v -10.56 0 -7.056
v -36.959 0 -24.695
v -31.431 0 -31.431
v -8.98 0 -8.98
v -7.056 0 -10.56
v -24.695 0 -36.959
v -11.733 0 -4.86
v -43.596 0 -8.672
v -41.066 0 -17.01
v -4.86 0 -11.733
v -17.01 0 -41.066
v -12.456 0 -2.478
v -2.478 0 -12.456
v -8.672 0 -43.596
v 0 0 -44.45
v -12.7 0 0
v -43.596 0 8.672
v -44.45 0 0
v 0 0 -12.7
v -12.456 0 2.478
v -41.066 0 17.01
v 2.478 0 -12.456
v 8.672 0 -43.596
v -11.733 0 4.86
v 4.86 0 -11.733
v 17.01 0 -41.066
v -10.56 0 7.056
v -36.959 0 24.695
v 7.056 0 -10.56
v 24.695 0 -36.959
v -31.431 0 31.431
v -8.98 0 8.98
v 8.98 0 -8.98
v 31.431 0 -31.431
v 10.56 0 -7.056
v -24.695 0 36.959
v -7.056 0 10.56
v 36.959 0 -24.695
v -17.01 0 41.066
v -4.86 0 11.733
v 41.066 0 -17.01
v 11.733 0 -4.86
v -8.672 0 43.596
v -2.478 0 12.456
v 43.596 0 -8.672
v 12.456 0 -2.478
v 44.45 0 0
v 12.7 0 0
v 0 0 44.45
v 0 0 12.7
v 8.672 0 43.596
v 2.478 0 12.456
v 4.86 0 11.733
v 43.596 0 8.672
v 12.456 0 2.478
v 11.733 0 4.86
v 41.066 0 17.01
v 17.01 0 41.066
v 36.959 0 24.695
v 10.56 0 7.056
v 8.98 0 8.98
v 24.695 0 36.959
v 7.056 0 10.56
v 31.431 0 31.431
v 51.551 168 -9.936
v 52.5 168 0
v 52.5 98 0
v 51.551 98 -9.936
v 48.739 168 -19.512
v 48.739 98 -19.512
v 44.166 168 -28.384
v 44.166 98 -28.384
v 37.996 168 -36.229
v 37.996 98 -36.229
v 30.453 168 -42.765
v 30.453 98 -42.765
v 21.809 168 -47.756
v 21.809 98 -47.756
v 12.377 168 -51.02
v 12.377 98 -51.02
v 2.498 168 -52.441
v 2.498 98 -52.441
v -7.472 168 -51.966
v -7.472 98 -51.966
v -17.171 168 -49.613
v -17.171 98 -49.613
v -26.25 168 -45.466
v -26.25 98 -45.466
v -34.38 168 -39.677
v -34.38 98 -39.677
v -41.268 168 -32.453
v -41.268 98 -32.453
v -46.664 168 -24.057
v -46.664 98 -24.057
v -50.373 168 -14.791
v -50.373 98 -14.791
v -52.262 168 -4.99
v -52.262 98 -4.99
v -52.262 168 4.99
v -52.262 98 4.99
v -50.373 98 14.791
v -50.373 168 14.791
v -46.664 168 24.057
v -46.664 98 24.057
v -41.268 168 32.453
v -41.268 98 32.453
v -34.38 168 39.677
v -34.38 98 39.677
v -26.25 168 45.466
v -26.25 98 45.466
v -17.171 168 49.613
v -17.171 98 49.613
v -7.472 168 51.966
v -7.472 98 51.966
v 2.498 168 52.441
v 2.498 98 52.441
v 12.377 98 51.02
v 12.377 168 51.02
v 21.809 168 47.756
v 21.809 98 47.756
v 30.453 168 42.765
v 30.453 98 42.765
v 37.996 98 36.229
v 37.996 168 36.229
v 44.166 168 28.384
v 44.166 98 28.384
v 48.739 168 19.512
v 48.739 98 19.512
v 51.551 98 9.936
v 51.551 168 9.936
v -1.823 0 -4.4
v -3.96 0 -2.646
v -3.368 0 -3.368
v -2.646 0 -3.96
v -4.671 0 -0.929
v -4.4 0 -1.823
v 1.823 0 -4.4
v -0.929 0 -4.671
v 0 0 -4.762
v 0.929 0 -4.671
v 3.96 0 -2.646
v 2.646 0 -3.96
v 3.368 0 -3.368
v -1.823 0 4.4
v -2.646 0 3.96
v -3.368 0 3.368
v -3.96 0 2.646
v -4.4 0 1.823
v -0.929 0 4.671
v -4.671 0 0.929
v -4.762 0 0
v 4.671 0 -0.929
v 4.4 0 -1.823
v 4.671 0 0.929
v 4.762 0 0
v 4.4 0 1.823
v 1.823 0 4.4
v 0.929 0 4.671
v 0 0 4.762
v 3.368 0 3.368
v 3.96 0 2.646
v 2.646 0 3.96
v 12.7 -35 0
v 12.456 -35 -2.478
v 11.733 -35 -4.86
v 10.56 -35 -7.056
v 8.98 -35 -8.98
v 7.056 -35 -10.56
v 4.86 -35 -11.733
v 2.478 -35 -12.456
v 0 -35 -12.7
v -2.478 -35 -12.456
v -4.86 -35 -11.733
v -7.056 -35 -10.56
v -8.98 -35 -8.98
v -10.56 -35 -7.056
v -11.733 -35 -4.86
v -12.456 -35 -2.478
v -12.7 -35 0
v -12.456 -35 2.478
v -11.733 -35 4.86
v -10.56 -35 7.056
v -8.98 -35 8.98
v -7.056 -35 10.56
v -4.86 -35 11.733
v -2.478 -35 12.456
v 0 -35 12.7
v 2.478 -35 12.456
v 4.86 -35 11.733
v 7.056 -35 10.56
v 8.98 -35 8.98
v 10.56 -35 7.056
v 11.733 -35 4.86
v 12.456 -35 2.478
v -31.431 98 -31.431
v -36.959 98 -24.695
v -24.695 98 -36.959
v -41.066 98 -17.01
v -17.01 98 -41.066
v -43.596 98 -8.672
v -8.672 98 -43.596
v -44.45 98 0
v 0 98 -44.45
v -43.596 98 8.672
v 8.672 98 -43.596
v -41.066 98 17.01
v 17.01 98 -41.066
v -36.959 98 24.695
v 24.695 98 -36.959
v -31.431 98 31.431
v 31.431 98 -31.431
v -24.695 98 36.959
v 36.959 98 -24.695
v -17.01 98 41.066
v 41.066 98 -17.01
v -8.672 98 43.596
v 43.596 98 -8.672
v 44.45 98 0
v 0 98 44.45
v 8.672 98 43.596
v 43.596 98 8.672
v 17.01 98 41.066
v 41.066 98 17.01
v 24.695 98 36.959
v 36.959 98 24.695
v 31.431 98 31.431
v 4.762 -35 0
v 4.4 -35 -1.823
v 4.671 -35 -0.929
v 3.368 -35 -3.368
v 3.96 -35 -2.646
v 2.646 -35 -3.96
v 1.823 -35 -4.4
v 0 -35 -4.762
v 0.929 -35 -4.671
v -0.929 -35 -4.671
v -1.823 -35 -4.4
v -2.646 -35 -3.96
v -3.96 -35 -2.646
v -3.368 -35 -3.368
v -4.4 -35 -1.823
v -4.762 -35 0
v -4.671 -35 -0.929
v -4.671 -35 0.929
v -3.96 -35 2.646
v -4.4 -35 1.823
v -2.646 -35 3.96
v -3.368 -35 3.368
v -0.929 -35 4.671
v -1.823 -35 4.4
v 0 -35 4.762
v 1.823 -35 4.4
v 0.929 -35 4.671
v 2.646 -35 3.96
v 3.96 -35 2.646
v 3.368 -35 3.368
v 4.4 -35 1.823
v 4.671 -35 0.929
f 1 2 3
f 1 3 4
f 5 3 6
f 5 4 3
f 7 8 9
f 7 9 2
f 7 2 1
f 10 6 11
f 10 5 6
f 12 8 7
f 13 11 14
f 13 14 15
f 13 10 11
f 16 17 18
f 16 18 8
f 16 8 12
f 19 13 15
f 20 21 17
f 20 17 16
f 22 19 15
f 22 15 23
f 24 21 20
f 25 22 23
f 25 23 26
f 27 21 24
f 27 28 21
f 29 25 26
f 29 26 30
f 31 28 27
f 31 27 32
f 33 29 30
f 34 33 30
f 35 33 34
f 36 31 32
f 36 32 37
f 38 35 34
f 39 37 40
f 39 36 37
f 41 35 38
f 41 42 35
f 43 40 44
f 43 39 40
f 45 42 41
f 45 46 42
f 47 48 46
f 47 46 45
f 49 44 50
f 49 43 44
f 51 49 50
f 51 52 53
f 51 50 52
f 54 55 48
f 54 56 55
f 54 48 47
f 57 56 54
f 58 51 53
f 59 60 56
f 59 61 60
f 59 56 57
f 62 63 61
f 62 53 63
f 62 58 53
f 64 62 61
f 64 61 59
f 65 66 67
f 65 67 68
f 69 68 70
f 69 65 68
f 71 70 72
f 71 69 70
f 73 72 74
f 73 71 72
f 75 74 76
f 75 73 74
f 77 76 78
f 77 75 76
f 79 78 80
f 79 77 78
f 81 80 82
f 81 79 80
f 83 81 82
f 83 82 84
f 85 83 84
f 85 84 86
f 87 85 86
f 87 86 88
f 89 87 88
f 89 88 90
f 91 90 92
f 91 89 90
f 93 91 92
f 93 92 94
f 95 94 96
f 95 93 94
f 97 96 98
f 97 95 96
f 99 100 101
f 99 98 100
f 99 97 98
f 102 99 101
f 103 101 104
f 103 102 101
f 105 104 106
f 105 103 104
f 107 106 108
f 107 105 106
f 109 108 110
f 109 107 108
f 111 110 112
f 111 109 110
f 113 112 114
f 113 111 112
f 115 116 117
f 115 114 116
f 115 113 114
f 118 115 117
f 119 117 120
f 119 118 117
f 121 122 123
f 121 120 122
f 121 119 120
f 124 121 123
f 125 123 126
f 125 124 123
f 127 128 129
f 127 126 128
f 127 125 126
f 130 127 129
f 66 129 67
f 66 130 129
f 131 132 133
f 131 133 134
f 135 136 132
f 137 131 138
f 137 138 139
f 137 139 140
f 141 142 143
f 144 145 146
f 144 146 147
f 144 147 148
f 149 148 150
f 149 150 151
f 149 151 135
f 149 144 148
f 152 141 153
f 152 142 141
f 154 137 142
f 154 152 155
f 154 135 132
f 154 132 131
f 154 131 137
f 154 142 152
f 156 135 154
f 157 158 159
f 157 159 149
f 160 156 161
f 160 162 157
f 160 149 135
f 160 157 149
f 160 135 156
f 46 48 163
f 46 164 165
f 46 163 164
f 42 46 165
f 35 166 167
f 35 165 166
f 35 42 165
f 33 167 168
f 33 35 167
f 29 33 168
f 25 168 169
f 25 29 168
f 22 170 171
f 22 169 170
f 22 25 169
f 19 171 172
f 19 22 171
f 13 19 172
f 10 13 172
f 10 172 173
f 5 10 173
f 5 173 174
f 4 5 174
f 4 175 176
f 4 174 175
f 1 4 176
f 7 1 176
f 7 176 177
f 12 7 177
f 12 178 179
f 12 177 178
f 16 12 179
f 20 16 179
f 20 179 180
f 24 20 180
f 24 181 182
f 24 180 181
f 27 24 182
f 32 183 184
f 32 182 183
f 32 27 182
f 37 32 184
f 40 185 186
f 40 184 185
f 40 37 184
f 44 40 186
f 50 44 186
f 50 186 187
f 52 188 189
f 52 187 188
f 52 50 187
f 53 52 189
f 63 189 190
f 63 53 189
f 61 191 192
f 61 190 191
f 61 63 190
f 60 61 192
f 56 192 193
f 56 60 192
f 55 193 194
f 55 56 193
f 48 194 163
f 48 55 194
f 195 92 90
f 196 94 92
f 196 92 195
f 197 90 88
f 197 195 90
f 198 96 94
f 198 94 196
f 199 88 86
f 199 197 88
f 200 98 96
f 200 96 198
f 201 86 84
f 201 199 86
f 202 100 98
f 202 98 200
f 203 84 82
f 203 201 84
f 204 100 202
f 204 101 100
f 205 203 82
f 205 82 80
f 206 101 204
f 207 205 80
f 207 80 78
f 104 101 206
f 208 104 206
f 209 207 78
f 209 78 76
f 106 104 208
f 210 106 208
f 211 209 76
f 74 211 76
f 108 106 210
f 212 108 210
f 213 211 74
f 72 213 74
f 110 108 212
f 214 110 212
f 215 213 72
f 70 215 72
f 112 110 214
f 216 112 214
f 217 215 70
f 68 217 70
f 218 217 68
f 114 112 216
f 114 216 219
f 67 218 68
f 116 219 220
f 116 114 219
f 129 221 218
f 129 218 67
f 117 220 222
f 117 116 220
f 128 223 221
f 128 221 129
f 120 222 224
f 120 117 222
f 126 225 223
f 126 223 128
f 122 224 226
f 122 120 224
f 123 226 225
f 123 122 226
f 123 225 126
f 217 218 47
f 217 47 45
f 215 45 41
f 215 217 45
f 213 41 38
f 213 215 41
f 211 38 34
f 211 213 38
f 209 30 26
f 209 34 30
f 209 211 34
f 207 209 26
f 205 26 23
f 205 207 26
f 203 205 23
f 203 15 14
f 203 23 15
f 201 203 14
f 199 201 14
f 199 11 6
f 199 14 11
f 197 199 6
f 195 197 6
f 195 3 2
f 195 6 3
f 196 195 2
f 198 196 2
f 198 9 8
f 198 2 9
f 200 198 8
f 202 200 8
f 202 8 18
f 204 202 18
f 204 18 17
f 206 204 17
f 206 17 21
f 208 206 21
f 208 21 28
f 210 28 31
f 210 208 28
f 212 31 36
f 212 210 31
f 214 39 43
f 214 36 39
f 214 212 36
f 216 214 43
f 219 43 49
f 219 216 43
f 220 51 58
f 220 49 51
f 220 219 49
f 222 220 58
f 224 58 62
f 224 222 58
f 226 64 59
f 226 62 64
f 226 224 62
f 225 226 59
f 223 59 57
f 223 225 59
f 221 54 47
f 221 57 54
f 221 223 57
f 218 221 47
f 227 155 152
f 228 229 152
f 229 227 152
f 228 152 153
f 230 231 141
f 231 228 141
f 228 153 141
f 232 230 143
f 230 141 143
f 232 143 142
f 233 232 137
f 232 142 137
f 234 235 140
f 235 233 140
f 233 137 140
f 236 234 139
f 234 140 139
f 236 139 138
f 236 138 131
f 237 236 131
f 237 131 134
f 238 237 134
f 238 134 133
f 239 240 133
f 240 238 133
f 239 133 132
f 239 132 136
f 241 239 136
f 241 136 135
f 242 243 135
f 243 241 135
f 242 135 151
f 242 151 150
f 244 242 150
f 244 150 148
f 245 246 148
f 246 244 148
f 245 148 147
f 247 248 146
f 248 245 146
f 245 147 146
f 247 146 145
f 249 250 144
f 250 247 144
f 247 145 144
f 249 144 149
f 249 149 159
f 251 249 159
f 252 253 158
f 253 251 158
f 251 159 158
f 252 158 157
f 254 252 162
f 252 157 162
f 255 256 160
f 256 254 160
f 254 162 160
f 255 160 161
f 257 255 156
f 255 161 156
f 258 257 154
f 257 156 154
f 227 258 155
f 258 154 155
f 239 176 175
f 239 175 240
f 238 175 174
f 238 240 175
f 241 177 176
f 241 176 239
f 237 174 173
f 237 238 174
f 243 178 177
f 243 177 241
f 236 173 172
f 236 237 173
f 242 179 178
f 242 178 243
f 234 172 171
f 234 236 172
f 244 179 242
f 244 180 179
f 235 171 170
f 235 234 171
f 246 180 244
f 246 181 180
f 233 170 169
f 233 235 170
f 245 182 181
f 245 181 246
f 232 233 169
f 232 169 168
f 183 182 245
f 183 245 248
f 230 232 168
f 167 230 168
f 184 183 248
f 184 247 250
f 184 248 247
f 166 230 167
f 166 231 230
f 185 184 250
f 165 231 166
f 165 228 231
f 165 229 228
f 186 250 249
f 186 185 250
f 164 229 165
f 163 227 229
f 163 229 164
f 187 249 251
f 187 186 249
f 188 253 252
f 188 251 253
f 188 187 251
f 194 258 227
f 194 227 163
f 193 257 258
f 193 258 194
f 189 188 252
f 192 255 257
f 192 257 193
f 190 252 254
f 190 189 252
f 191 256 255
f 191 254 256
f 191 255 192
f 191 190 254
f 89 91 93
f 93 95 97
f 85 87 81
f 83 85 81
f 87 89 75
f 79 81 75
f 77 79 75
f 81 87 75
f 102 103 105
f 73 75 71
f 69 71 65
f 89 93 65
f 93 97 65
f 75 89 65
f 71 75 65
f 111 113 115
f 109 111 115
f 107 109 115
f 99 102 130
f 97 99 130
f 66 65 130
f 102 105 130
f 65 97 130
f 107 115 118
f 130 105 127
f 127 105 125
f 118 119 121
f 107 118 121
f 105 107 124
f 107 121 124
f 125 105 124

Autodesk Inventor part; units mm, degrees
ref_plane "YZ Plane" through (0, 0, 0) normal (1, 0, 0) x (0, 1, 0)
ref_plane "XZ Plane" through (0, 0, 0) normal (0, 1, 0) x (-1, 0, 0)
ref_plane "XY Plane" through (0, 0, 0) normal (0, 0, 1) x (1, 0, 0)
sketch "Sketch1" plane through (0, 0, 0) normal (0, 0, 1) x (1, 0, 0)
  line L0 (0, 0) -> (44.45, 0)
  line L1 (44.45, 0) -> (44.45, 98)
  line L2 (44.45, 98) -> (0, 98)
  line L3 (0, 98) -> (0, 0)
  line L4 (4.7625, 0) -> (0, 0)
  line L5 (0, 0) -> (0, -35)
  line L6 (0, -35) -> (4.7625, -35)
  line L7 (4.7625, -35) -> (4.7625, 0)
  line L8 (4.7625, -35) -> (12.7, -35)
  line L9 (12.7, -35) -> (12.7, 0)
  line L10 (12.7, 0) -> (4.7625, 0)
  line L11 (4.7625, 0) -> (4.7625, -35)
  line L12 (0, 98) -> (52.5, 98)
  line L13 (52.5, 98) -> (52.5, 168)
  line L14 (52.5, 168) -> (0, 168)
  line L15 (0, 168) -> (0, 98)
  dimension "d0" = 44.45
  dimension "d1" = 98
  dimension "d3" = 4.7625
  dimension "d4" = 35
  dimension "d5" = 12.7
  dimension "d6" = 52.5
  dimension "d7" = 70
revolve "Revolution1" add sketch "Sketch1" angle 360 about axis through (0, 98, 0) along (0, -1, 0) contours L3 L2 L1 L0 | L0 L9 L8 L7 | L15 L14 L13 L12 L2
properties part number "Spindle"
